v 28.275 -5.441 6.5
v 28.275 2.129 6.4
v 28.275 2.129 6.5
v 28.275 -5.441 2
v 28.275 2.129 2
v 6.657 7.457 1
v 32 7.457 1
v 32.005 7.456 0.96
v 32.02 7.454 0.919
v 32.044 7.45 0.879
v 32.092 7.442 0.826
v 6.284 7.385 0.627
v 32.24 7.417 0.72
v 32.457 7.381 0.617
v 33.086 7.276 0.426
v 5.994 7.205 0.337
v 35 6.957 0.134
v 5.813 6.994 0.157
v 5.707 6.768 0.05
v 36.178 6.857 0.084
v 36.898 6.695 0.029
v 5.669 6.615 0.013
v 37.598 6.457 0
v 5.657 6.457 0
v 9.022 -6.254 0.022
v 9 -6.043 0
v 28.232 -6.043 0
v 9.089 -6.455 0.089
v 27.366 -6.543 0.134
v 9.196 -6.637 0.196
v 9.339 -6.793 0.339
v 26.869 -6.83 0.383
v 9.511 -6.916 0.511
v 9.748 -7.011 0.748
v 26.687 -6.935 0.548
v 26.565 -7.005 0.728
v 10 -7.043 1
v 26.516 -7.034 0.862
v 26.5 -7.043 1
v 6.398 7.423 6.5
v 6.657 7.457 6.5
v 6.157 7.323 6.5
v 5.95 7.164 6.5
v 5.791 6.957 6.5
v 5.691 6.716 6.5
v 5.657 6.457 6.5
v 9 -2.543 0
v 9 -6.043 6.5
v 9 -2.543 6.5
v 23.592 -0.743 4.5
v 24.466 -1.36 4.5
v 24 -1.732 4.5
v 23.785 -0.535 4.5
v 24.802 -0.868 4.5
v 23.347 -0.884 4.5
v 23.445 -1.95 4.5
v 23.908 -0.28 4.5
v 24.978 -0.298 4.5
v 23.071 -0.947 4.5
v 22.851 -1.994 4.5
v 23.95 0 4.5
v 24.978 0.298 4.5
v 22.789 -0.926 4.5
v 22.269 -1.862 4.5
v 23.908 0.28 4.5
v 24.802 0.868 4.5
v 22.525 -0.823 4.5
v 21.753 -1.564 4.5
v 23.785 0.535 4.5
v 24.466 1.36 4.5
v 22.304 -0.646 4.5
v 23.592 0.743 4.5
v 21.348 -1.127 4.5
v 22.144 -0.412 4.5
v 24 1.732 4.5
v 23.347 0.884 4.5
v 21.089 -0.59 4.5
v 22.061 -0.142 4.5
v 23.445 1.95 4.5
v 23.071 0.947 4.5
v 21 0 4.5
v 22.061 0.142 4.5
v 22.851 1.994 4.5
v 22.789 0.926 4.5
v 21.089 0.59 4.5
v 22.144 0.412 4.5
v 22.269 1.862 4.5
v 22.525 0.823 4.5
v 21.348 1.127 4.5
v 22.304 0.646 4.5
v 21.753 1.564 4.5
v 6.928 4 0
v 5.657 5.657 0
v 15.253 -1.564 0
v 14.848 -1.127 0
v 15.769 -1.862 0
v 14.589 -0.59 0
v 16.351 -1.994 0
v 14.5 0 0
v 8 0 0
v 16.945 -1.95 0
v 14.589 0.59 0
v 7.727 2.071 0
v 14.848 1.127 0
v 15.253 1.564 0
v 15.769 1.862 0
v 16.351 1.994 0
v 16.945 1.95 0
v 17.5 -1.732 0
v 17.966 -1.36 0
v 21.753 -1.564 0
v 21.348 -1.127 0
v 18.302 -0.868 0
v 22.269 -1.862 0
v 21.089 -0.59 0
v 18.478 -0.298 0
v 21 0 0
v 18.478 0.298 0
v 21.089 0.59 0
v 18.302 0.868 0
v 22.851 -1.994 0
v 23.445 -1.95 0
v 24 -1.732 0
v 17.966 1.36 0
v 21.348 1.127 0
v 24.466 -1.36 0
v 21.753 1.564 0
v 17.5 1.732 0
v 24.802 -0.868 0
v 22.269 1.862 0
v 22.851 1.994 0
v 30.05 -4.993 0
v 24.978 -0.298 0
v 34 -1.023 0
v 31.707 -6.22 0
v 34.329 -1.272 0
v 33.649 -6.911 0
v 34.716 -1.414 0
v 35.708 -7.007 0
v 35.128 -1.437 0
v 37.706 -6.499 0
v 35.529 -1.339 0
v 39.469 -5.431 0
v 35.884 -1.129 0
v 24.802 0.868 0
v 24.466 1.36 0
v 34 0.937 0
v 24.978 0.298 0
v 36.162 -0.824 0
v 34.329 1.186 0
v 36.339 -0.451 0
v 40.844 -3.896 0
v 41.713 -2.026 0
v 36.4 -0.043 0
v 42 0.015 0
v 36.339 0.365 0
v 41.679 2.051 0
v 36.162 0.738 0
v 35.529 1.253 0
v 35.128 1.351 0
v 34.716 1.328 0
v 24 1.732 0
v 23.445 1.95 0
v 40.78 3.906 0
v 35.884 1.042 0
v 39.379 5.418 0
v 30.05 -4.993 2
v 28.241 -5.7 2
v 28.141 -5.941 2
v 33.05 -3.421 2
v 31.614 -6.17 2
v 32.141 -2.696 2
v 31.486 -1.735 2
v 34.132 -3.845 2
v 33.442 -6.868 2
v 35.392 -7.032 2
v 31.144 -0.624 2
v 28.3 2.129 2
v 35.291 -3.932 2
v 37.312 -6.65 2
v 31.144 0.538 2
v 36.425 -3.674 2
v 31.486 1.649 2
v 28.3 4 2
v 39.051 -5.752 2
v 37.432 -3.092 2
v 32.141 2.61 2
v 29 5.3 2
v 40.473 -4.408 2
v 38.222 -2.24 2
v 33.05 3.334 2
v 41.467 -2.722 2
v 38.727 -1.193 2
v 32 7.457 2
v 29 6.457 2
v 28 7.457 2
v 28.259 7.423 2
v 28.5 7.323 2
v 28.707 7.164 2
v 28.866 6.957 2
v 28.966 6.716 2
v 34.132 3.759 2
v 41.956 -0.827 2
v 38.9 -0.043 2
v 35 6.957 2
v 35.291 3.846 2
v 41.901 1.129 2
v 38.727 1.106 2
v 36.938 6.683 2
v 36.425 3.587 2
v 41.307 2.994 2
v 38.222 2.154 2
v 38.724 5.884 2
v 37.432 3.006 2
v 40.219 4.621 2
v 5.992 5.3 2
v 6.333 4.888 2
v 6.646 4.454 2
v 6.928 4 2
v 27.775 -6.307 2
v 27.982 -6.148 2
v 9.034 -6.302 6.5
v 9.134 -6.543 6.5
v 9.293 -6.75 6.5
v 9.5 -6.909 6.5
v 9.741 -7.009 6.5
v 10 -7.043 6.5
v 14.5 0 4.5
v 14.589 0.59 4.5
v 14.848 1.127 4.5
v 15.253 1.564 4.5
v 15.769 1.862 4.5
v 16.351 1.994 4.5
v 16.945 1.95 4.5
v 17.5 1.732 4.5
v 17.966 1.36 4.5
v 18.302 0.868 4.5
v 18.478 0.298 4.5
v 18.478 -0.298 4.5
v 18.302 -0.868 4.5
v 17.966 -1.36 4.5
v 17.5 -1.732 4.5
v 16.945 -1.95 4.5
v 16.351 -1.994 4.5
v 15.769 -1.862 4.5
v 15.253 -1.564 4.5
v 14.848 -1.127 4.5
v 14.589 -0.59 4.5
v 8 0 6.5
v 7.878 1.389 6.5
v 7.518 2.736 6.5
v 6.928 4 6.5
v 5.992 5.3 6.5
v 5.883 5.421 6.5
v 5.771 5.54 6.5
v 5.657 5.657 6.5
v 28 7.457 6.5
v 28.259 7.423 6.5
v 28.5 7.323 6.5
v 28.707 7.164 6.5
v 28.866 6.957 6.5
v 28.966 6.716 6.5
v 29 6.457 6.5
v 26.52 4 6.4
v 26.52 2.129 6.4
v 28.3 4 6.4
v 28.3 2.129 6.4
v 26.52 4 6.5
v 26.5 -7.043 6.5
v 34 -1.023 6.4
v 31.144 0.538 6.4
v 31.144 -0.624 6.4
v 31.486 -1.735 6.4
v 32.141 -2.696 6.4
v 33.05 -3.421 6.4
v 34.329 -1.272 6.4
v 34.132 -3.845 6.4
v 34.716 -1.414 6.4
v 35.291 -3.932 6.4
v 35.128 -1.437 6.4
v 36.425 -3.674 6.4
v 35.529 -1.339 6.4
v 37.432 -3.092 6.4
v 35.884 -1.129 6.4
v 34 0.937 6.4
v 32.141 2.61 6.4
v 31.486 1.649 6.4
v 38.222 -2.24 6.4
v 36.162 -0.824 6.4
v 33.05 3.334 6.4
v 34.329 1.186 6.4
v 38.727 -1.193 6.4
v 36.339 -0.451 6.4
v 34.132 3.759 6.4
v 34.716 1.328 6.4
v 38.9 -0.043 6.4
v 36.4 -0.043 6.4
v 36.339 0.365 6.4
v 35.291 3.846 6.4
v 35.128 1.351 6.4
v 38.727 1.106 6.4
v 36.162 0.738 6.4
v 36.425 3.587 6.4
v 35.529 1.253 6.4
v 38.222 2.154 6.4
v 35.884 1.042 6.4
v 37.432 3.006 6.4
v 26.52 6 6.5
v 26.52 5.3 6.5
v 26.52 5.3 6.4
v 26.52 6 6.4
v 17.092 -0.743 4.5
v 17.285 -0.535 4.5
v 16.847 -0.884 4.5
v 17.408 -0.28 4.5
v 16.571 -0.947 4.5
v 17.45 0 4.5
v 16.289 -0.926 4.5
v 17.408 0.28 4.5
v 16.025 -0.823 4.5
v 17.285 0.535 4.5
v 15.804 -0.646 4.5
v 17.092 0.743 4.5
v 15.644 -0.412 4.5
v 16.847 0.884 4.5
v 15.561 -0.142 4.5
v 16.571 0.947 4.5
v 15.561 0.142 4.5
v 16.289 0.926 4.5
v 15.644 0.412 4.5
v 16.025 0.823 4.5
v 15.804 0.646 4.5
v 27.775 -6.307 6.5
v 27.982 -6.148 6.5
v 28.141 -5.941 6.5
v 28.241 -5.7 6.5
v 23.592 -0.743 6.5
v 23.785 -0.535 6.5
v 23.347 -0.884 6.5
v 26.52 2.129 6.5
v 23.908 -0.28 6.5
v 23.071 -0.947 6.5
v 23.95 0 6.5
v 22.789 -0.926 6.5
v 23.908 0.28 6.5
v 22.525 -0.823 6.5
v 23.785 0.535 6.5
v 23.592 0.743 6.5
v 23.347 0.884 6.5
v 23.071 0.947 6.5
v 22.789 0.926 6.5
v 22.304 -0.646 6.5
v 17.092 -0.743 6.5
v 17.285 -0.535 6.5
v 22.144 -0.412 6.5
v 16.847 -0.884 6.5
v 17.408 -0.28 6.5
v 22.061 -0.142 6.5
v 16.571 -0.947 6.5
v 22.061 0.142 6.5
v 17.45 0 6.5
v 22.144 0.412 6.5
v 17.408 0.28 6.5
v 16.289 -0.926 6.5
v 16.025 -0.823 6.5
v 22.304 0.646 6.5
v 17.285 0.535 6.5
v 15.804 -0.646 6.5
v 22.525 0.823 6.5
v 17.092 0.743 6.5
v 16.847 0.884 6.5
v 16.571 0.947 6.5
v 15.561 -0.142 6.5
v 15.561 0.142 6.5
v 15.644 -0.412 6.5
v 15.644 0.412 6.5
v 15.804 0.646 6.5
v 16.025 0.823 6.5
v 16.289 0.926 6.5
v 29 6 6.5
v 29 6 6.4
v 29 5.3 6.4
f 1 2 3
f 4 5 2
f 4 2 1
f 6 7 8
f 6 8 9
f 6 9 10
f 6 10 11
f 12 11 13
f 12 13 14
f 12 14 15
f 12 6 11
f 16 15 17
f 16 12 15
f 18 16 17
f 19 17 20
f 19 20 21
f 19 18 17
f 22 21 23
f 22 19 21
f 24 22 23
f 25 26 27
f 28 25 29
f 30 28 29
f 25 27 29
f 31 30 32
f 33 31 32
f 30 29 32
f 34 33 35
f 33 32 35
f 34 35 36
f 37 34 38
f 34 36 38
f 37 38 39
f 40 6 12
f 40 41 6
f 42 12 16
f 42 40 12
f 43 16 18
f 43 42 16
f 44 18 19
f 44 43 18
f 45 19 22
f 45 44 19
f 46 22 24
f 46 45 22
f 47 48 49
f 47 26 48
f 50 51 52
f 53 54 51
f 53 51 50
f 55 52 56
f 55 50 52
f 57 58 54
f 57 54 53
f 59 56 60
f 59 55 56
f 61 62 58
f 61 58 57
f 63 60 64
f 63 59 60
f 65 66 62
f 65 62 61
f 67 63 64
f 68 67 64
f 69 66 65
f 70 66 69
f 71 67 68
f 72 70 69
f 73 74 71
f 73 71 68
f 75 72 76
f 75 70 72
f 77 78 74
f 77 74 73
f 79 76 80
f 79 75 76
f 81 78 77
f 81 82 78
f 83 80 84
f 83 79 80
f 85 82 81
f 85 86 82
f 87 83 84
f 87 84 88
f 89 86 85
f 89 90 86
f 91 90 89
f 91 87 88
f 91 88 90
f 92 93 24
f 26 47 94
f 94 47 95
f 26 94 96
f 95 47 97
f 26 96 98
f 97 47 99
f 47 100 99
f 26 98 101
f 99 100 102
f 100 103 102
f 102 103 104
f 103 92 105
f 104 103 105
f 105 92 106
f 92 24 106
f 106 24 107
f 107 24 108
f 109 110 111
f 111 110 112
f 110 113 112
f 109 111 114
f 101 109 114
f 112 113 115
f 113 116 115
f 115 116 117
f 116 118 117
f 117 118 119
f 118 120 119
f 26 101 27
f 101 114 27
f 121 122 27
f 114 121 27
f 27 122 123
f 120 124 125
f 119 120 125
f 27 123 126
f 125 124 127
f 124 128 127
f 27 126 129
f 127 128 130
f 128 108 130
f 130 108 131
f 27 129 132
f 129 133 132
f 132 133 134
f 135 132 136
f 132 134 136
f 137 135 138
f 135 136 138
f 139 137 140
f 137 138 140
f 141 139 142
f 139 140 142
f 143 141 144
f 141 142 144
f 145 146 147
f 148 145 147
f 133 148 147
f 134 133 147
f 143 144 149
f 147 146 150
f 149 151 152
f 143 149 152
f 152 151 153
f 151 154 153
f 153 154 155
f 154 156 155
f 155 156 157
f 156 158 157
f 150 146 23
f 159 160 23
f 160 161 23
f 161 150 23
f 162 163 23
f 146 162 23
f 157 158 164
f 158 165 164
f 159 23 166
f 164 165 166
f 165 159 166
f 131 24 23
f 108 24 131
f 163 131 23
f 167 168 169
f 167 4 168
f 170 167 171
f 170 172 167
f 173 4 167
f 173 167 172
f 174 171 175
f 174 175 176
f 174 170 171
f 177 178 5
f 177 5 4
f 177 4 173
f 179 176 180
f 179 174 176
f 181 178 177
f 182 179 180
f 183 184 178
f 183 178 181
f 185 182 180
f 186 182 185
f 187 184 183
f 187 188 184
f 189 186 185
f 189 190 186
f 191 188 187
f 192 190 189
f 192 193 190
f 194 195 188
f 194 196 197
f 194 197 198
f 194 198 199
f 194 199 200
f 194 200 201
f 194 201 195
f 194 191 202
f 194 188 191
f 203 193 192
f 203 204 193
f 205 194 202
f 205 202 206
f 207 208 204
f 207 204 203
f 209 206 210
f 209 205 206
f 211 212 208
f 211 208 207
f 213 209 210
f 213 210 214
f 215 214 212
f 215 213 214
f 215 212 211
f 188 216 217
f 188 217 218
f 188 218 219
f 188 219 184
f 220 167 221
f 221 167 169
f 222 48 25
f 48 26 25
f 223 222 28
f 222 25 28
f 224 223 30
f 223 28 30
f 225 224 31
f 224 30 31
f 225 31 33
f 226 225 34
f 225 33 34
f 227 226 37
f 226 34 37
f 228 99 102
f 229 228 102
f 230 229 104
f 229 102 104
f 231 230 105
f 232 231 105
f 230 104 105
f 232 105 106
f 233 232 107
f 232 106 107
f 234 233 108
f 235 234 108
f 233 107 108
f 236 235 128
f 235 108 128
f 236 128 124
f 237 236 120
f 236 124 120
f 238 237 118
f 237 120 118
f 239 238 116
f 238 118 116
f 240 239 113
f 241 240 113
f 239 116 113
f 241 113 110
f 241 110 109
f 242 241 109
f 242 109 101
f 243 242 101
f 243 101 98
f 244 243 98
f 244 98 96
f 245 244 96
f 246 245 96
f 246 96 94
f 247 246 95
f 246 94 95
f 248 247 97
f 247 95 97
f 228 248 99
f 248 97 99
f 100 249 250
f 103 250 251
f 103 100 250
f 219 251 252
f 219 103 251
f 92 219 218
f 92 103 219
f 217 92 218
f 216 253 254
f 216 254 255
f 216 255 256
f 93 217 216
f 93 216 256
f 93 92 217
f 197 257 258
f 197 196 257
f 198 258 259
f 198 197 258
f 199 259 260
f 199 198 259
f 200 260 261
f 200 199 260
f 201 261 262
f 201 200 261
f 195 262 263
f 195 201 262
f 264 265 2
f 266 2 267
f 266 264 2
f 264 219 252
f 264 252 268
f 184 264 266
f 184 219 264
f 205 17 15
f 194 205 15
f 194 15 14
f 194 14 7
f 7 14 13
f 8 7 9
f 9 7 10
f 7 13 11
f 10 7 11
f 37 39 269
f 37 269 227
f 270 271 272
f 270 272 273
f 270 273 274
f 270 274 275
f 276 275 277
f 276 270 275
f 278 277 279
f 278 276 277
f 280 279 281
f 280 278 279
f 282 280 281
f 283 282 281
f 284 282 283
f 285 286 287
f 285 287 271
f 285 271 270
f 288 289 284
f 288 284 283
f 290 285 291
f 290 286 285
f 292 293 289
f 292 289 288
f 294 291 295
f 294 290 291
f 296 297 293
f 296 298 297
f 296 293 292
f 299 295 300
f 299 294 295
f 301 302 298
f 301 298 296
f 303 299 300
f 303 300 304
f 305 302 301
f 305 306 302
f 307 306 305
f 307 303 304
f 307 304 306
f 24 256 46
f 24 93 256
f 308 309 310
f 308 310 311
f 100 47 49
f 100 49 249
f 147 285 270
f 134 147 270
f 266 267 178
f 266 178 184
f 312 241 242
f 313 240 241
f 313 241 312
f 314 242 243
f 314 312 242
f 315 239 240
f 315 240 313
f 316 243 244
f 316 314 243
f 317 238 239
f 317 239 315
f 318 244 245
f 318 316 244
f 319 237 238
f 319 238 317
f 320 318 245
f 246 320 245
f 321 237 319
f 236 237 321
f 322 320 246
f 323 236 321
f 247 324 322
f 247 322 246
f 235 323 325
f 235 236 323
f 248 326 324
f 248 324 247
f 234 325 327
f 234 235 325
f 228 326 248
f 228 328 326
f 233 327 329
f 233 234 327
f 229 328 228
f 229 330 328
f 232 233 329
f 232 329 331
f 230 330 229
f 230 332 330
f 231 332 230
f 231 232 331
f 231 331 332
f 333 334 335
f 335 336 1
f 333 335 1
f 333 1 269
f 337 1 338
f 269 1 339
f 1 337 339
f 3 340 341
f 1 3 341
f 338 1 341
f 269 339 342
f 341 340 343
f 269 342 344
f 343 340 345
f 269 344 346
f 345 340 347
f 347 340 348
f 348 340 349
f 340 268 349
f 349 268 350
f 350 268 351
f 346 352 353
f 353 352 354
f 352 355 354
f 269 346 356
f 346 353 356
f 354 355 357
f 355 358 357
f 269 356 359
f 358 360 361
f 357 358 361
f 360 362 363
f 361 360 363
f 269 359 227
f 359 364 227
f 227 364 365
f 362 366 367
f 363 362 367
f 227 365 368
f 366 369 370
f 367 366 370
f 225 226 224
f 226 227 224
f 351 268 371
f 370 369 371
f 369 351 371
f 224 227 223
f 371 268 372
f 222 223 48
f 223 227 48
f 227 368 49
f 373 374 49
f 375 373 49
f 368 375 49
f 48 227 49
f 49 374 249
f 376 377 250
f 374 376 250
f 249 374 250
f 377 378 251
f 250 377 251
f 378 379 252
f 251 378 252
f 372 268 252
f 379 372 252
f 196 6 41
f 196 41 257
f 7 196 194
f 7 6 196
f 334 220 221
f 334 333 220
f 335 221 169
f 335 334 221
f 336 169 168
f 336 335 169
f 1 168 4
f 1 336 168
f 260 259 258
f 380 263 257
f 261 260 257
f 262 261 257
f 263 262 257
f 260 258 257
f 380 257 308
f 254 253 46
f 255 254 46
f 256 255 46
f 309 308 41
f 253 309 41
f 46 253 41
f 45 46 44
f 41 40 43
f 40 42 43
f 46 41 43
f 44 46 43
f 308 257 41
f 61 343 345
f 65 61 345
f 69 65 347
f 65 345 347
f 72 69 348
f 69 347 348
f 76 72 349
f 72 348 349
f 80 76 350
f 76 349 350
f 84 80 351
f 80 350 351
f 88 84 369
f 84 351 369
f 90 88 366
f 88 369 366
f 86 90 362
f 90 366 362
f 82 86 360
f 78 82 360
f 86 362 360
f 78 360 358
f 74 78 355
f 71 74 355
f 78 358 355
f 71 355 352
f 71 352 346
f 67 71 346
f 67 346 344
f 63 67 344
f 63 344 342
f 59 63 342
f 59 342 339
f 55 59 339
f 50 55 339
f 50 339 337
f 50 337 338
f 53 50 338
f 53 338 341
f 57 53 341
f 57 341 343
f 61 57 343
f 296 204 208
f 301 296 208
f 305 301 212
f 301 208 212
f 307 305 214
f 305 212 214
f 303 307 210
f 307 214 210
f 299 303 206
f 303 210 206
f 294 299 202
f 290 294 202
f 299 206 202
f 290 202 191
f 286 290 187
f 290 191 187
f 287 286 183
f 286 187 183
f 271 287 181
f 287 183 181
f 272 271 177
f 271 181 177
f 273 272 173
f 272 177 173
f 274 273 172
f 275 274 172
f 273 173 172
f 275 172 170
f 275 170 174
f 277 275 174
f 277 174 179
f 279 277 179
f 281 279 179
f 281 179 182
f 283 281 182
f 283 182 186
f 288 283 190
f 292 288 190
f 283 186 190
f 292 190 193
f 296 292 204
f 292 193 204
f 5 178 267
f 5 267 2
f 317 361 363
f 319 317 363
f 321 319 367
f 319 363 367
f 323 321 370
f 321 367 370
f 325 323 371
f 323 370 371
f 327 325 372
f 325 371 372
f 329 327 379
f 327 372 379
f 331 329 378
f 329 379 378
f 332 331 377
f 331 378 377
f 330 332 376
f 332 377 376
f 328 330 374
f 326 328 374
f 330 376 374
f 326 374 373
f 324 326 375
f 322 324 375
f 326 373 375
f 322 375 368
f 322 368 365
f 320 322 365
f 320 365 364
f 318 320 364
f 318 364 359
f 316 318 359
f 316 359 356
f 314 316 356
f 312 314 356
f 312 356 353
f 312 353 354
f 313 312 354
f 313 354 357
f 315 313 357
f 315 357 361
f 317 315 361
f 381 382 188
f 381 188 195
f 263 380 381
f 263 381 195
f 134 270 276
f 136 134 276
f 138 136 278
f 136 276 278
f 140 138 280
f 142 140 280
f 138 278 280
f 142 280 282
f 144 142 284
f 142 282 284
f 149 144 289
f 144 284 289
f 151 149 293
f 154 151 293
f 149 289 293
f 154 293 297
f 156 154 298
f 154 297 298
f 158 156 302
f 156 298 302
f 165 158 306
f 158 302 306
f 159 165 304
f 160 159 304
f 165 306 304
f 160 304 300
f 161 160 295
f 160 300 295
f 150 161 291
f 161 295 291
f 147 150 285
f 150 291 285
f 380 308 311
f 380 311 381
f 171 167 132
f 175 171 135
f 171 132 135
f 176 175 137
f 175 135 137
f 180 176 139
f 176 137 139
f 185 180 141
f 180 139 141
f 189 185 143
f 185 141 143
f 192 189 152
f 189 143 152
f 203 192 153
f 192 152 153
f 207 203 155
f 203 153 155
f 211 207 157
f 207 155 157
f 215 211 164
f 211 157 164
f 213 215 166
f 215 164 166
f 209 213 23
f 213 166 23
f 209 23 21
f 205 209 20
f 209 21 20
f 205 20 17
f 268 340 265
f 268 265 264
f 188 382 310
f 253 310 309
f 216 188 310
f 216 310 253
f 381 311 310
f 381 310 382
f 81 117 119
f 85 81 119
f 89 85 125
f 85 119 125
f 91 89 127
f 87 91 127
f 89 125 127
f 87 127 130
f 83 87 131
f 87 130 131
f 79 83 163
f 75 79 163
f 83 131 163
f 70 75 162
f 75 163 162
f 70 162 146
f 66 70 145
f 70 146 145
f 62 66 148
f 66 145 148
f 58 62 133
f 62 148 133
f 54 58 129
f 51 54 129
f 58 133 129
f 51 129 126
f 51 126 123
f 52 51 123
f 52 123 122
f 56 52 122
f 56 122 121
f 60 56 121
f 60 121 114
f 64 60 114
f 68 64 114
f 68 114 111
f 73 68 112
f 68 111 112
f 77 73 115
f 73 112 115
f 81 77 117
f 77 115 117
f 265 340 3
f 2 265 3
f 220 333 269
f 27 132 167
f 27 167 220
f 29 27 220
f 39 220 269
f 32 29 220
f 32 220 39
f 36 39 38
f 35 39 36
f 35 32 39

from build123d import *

# Parameters (mm, degrees)
BOSS_EXTRUDE1_DEPTH  = 2
BOSS_EXTRUDE6_DEPTH  = 4.5
CUT_EXTRUDE6_DEPTH   = 4.5
BOSS_EXTRUDE14_DEPTH = 2.3
SKETCH32_R           = 3
CUT_EXTRUDE7_DEPTH   = 2.3
SKETCH33_W           = 22.343119157
SKETCH33_H           = 2
SKETCH33_W_2         = 17.499973406
SKETCH33_H_2         = 1.5
BOSS_EXTRUDE15_DEPTH = 1.2
SKETCH35_W           = 5.479645996
SKETCH35_H           = 3.871139505
CUT_EXTRUDE8_DEPTH   = 2.4
SKETCH36_W           = 3.7
SKETCH36_H           = 1.871139505
CUT_EXTRUDE9_DEPTH   = 4.4
SKETCH37_R           = 3.9
BOSS_EXTRUDE16_DEPTH = 4.4
CUT_EXTRUDE10_DEPTH  = 7.4
SKETCH43_R           = 2.5
BOSS_EXTRUDE17_DEPTH = 1.2
SKETCH44_R           = 0.95
CUT_EXTRUDE11_DEPTH  = 11
SKETCH45_R           = 2
CUT_EXTRUDE12_DEPTH  = 4.5
SKETCH49_R           = 0.75
CUT_EXTRUDE13_DEPTH  = 3
SKETCH51_W           = 3
SKETCH51_H           = 3.965585241
CUT_EXTRUDE14_DEPTH  = 6.8
FILLET1_R            = 1.5
FILLET3_R            = 1


with BuildPart() as part:
    # Sketch3 → Boss-Extrude1 (new body)
    with BuildSketch(Plane.XY):
        with BuildLine():
            Line((8, 0), (9, -2.543145751))
            Line((9, -2.543145751), (9, -7.043145751))
            Line((9, -7.043145751), (26.499973406, -7.043145751))
            Line((26.499973406, -7.043145751), (30.050225938, -4.992893219))
            ThreePointArc((30.050225938, -4.992893219), (41.467130134, -2.721929777), (34.999973406, 6.956854249))
            Line((34.999973406, 6.956854249), (31.999973406, 7.456854249))
            Line((31.999973406, 7.456854249), (5.656854249, 7.456854249))
            Line((5.656854249, 7.456854249), (5.656854249, 5.656854249))
            ThreePointArc((5.656854249, 5.656854249), (7.39103626, 3.061467459), (8, 0))
        make_face()
    extrude(amount=BOSS_EXTRUDE1_DEPTH)

    # Sketch22 → Boss-Extrude6 (add)
    with BuildSketch(Plane.XY.offset(2)):
        with BuildLine():
            Line((5.656854249, 7.456854249), (26.499973406, 7.456854249))
            Line((26.499973406, 7.456854249), (31.999973406, 7.456854249))
            Line((31.999973406, 7.456854249), (31.999973406, 2.128860495))
            Line((31.999973406, 2.128860495), (28.275099672, 2.128860495))
            Line((28.275099672, 2.128860495), (28.275099672, -6.018019485))
            Line((28.275099672, -6.018019485), (26.499973406, -7.043145751))
            Line((26.499973406, -7.043145751), (9, -7.043145751))
            Line((9, -7.043145751), (9, -2.543145751))
            Line((9, -2.543145751), (8, 0))
            ThreePointArc((8, 0), (7.39103626, 3.061467459), (5.656854249, 5.656854249))
            Line((5.656854249, 5.656854249), (5.656854249, 7.456854249))
        make_face()
    extrude(amount=BOSS_EXTRUDE6_DEPTH)

    # Sketch26 → Cut-Extrude6 (cut)
    with BuildSketch(Plane.XY.offset(2)):
        Polygon((18.098080448, 5.3), (2.530052458, 5.3), (2.530052458, 4), (18.098080448, 4), (31.999973406, 4), (31.999973406, 5.3), align=None)
    extrude(amount=CUT_EXTRUDE6_DEPTH, mode=Mode.SUBTRACT)


with BuildPart() as body_2:
    # Sketch31 → Boss-Extrude14 (new body)
    with BuildSketch(Plane.XY.offset(6.5)):
        with BuildLine():
            Line((2.432688066, 5.656854249), (0, 5.656854249))
            ThreePointArc((0, 5.656854249), (-5.656854249, 0), (0, -5.656854249))
            Line((0, -5.656854249), (9, -5.656854249))
            Line((9, -5.656854249), (9, -7.043145751))
            Line((9, -7.043145751), (9, -8.543145751))
            Line((9, -8.543145751), (26.499973406, -8.543145751))
            Line((26.499973406, -8.543145751), (26.499973406, -7.043145751))
            Line((26.499973406, -7.043145751), (26.499973406, 2.128860495))
            Line((26.499973406, 2.128860495), (28.275099672, 2.128860495))
            Line((28.275099672, 2.128860495), (31.999973406, 2.128860495))
            Line((31.999973406, 2.128860495), (31.999973406, 7.456854249))
            Line((31.999973406, 7.456854249), (31.999973406, 8.956854249))
            Line((31.999973406, 8.956854249), (5.656854249, 8.956854249))
            Line((5.656854249, 8.956854249), (5.656854249, 7.456854249))
            Line((5.656854249, 7.456854249), (5.656854249, 5.656854249))
            Line((5.656854249, 5.656854249), (2.432688066, 5.656854249))
        make_face()
    extrude(amount=BOSS_EXTRUDE14_DEPTH)

    # Sketch32 → Cut-Extrude7 (cut)
    with BuildSketch(Plane.XY.offset(8.8)):
        Circle(SKETCH32_R)
    extrude(amount=-CUT_EXTRUDE7_DEPTH, mode=Mode.SUBTRACT)

    # Sketch33 → Boss-Extrude15 (add)
    with BuildSketch(Plane.XY.offset(8.8)):
        with Locations((16.828413828, 7.956854249)):
            Rectangle(SKETCH33_W, SKETCH33_H)
        with Locations((17.749986703, -7.793145751)):
            Rectangle(SKETCH33_W_2, SKETCH33_H_2)
        with BuildLine():
            Line((7, -4.156854249), (25.499973406, -4.156854249))
            Line((25.499973406, -4.156854249), (25.499973406, -2.156854249))
            Line((25.499973406, -2.156854249), (7, -2.156854249))
            ThreePointArc((7, -2.156854249), (6, -3.156854249), (7, -4.156854249))
        make_face()
        with BuildLine():
            Line((25.499973406, 2.172006245), (7, 2.172006245))
            ThreePointArc((7, 2.172006245), (6, 3.172006245), (7, 4.172006245))
            Line((7, 4.172006245), (25.499973406, 4.172006245))
            Line((25.499973406, 4.172006245), (25.499973406, 2.172006245))
        make_face()
    extrude(amount=BOSS_EXTRUDE15_DEPTH)


with BuildPart() as cut_extrude8_tool:
    # Sketch35 → Cut-Extrude8 (new body)
    with BuildSketch(Plane.XY.offset(8.8)):
        with Locations((29.260150408, 4.064430247)):
            Rectangle(SKETCH35_W, SKETCH35_H)
    extrude(amount=-CUT_EXTRUDE8_DEPTH)


with BuildPart() as part_1:
    add(part.part)

    # Cut-Extrude8: cut by cut_extrude8_tool
    add(cut_extrude8_tool.part, mode=Mode.SUBTRACT)

    # Sketch36 → Cut-Extrude9 (cut)
    with BuildSketch(Plane.XY.offset(6.4)):
        with Locations((30.149973406, 3.064430247)):
            Rectangle(SKETCH36_W, SKETCH36_H)
    extrude(amount=-CUT_EXTRUDE9_DEPTH, mode=Mode.SUBTRACT)

    # Sketch37 → Boss-Extrude16 (add)
    with BuildSketch(Plane.XY.offset(2)):
        with Locations((34.999973406, -0.043145751)):
            Circle(SKETCH37_R)
    extrude(amount=BOSS_EXTRUDE16_DEPTH)

    # Sketch39 → Cut-Extrude10 (cut, through all)
    with BuildSketch(Plane.XY.offset(6.4)):
        with BuildLine():
            Line((33.999973406, 0.936650147), (33.999973406, -1.022941648))
            ThreePointArc((33.999973406, -1.022941648), (36.399973406, -0.043145751), (33.999973406, 0.936650147))
        make_face()
    extrude(amount=-CUT_EXTRUDE10_DEPTH, mode=Mode.SUBTRACT)


with BuildPart() as body_2_1:
    add(body_2.part)

    # Cut-Extrude8: cut by cut_extrude8_tool
    add(cut_extrude8_tool.part, mode=Mode.SUBTRACT)

    # Sketch43 → Boss-Extrude17 (add)
    with BuildSketch(Plane.XY.offset(8.8)):
        with Locations((16.5, 0)):
            Circle(SKETCH43_R)
        with Locations((23, 0)):
            Circle(SKETCH43_R)
    extrude(amount=BOSS_EXTRUDE17_DEPTH)


with BuildPart() as cut_extrude11_tool:
    # Sketch44 → Cut-Extrude11 (new body, through all)
    with BuildSketch(Plane.XY.offset(10)):
        with Locations((16.5, 0)):
            Circle(SKETCH44_R)
        with Locations((23, 0)):
            Circle(SKETCH44_R)
    extrude(amount=-CUT_EXTRUDE11_DEPTH)


with BuildPart() as part_2:
    add(part_1.part)

    # Cut-Extrude11: cut by cut_extrude11_tool
    add(cut_extrude11_tool.part, mode=Mode.SUBTRACT)

    # Sketch45 → Cut-Extrude12 (cut)
    with BuildSketch(Plane(origin=(0, 0, 0), x_dir=(-1, 0, 0), z_dir=(0, 0, -1))):
        with Locations((-16.5, 0)):
            Circle(SKETCH45_R)
        with Locations((-23, 0)):
            Circle(SKETCH45_R)
    extrude(amount=-CUT_EXTRUDE12_DEPTH, mode=Mode.SUBTRACT)


with BuildPart() as body_2_2:
    add(body_2_1.part)

    # Cut-Extrude11: cut by cut_extrude11_tool
    add(cut_extrude11_tool.part, mode=Mode.SUBTRACT)

    # Sketch49 → Cut-Extrude13 (cut)
    with BuildSketch(Plane.XZ.offset(-6.956854249)):
        with Locations((24.999973406, 10)):
            Circle(SKETCH49_R)
    extrude(amount=-CUT_EXTRUDE13_DEPTH, mode=Mode.SUBTRACT)


with BuildPart() as cut_extrude14_tool:
    # Sketch51 → Cut-Extrude14 (new body)
    with BuildSketch(Plane.XY.offset(8.8)):
        with Locations((30.499973406, 6.974061629)):
            Rectangle(SKETCH51_W, SKETCH51_H)
    extrude(amount=-CUT_EXTRUDE14_DEPTH)


with BuildPart() as part_3:
    add(part_2.part)

    # Cut-Extrude14: cut by cut_extrude14_tool
    add(cut_extrude14_tool.part, mode=Mode.SUBTRACT)

    # Fillet3
    fillet3_edges = [part_3.edges().sort_by_distance(p)[0] for p in [
        (28.275099672, -6.018019485, 4.25),
        (28.999973406, 7.456854249, 4.25),
        (9, -7.043145751, 3.25),
        (5.656854249, 7.456854249, 3.25),
        (17.749986703, -7.043145751, 0),
        (18.828413828, 7.456854249, 0),
    ]]
    fillet(fillet3_edges, radius=FILLET3_R)


with BuildPart() as body_2_3:
    add(body_2_2.part)

    # Cut-Extrude14: cut by cut_extrude14_tool
    add(cut_extrude14_tool.part, mode=Mode.SUBTRACT)

    # Fillet1
    fillet1_edges = [body_2_3.edges().sort_by_distance(p)[0] for p in [
        (17.328413828, 8.956854249, 6.5),
        (17.749986703, -8.543145751, 6.5),
    ]]
    fillet(fillet1_edges, radius=FILLET1_R)


solid = part_3.part
